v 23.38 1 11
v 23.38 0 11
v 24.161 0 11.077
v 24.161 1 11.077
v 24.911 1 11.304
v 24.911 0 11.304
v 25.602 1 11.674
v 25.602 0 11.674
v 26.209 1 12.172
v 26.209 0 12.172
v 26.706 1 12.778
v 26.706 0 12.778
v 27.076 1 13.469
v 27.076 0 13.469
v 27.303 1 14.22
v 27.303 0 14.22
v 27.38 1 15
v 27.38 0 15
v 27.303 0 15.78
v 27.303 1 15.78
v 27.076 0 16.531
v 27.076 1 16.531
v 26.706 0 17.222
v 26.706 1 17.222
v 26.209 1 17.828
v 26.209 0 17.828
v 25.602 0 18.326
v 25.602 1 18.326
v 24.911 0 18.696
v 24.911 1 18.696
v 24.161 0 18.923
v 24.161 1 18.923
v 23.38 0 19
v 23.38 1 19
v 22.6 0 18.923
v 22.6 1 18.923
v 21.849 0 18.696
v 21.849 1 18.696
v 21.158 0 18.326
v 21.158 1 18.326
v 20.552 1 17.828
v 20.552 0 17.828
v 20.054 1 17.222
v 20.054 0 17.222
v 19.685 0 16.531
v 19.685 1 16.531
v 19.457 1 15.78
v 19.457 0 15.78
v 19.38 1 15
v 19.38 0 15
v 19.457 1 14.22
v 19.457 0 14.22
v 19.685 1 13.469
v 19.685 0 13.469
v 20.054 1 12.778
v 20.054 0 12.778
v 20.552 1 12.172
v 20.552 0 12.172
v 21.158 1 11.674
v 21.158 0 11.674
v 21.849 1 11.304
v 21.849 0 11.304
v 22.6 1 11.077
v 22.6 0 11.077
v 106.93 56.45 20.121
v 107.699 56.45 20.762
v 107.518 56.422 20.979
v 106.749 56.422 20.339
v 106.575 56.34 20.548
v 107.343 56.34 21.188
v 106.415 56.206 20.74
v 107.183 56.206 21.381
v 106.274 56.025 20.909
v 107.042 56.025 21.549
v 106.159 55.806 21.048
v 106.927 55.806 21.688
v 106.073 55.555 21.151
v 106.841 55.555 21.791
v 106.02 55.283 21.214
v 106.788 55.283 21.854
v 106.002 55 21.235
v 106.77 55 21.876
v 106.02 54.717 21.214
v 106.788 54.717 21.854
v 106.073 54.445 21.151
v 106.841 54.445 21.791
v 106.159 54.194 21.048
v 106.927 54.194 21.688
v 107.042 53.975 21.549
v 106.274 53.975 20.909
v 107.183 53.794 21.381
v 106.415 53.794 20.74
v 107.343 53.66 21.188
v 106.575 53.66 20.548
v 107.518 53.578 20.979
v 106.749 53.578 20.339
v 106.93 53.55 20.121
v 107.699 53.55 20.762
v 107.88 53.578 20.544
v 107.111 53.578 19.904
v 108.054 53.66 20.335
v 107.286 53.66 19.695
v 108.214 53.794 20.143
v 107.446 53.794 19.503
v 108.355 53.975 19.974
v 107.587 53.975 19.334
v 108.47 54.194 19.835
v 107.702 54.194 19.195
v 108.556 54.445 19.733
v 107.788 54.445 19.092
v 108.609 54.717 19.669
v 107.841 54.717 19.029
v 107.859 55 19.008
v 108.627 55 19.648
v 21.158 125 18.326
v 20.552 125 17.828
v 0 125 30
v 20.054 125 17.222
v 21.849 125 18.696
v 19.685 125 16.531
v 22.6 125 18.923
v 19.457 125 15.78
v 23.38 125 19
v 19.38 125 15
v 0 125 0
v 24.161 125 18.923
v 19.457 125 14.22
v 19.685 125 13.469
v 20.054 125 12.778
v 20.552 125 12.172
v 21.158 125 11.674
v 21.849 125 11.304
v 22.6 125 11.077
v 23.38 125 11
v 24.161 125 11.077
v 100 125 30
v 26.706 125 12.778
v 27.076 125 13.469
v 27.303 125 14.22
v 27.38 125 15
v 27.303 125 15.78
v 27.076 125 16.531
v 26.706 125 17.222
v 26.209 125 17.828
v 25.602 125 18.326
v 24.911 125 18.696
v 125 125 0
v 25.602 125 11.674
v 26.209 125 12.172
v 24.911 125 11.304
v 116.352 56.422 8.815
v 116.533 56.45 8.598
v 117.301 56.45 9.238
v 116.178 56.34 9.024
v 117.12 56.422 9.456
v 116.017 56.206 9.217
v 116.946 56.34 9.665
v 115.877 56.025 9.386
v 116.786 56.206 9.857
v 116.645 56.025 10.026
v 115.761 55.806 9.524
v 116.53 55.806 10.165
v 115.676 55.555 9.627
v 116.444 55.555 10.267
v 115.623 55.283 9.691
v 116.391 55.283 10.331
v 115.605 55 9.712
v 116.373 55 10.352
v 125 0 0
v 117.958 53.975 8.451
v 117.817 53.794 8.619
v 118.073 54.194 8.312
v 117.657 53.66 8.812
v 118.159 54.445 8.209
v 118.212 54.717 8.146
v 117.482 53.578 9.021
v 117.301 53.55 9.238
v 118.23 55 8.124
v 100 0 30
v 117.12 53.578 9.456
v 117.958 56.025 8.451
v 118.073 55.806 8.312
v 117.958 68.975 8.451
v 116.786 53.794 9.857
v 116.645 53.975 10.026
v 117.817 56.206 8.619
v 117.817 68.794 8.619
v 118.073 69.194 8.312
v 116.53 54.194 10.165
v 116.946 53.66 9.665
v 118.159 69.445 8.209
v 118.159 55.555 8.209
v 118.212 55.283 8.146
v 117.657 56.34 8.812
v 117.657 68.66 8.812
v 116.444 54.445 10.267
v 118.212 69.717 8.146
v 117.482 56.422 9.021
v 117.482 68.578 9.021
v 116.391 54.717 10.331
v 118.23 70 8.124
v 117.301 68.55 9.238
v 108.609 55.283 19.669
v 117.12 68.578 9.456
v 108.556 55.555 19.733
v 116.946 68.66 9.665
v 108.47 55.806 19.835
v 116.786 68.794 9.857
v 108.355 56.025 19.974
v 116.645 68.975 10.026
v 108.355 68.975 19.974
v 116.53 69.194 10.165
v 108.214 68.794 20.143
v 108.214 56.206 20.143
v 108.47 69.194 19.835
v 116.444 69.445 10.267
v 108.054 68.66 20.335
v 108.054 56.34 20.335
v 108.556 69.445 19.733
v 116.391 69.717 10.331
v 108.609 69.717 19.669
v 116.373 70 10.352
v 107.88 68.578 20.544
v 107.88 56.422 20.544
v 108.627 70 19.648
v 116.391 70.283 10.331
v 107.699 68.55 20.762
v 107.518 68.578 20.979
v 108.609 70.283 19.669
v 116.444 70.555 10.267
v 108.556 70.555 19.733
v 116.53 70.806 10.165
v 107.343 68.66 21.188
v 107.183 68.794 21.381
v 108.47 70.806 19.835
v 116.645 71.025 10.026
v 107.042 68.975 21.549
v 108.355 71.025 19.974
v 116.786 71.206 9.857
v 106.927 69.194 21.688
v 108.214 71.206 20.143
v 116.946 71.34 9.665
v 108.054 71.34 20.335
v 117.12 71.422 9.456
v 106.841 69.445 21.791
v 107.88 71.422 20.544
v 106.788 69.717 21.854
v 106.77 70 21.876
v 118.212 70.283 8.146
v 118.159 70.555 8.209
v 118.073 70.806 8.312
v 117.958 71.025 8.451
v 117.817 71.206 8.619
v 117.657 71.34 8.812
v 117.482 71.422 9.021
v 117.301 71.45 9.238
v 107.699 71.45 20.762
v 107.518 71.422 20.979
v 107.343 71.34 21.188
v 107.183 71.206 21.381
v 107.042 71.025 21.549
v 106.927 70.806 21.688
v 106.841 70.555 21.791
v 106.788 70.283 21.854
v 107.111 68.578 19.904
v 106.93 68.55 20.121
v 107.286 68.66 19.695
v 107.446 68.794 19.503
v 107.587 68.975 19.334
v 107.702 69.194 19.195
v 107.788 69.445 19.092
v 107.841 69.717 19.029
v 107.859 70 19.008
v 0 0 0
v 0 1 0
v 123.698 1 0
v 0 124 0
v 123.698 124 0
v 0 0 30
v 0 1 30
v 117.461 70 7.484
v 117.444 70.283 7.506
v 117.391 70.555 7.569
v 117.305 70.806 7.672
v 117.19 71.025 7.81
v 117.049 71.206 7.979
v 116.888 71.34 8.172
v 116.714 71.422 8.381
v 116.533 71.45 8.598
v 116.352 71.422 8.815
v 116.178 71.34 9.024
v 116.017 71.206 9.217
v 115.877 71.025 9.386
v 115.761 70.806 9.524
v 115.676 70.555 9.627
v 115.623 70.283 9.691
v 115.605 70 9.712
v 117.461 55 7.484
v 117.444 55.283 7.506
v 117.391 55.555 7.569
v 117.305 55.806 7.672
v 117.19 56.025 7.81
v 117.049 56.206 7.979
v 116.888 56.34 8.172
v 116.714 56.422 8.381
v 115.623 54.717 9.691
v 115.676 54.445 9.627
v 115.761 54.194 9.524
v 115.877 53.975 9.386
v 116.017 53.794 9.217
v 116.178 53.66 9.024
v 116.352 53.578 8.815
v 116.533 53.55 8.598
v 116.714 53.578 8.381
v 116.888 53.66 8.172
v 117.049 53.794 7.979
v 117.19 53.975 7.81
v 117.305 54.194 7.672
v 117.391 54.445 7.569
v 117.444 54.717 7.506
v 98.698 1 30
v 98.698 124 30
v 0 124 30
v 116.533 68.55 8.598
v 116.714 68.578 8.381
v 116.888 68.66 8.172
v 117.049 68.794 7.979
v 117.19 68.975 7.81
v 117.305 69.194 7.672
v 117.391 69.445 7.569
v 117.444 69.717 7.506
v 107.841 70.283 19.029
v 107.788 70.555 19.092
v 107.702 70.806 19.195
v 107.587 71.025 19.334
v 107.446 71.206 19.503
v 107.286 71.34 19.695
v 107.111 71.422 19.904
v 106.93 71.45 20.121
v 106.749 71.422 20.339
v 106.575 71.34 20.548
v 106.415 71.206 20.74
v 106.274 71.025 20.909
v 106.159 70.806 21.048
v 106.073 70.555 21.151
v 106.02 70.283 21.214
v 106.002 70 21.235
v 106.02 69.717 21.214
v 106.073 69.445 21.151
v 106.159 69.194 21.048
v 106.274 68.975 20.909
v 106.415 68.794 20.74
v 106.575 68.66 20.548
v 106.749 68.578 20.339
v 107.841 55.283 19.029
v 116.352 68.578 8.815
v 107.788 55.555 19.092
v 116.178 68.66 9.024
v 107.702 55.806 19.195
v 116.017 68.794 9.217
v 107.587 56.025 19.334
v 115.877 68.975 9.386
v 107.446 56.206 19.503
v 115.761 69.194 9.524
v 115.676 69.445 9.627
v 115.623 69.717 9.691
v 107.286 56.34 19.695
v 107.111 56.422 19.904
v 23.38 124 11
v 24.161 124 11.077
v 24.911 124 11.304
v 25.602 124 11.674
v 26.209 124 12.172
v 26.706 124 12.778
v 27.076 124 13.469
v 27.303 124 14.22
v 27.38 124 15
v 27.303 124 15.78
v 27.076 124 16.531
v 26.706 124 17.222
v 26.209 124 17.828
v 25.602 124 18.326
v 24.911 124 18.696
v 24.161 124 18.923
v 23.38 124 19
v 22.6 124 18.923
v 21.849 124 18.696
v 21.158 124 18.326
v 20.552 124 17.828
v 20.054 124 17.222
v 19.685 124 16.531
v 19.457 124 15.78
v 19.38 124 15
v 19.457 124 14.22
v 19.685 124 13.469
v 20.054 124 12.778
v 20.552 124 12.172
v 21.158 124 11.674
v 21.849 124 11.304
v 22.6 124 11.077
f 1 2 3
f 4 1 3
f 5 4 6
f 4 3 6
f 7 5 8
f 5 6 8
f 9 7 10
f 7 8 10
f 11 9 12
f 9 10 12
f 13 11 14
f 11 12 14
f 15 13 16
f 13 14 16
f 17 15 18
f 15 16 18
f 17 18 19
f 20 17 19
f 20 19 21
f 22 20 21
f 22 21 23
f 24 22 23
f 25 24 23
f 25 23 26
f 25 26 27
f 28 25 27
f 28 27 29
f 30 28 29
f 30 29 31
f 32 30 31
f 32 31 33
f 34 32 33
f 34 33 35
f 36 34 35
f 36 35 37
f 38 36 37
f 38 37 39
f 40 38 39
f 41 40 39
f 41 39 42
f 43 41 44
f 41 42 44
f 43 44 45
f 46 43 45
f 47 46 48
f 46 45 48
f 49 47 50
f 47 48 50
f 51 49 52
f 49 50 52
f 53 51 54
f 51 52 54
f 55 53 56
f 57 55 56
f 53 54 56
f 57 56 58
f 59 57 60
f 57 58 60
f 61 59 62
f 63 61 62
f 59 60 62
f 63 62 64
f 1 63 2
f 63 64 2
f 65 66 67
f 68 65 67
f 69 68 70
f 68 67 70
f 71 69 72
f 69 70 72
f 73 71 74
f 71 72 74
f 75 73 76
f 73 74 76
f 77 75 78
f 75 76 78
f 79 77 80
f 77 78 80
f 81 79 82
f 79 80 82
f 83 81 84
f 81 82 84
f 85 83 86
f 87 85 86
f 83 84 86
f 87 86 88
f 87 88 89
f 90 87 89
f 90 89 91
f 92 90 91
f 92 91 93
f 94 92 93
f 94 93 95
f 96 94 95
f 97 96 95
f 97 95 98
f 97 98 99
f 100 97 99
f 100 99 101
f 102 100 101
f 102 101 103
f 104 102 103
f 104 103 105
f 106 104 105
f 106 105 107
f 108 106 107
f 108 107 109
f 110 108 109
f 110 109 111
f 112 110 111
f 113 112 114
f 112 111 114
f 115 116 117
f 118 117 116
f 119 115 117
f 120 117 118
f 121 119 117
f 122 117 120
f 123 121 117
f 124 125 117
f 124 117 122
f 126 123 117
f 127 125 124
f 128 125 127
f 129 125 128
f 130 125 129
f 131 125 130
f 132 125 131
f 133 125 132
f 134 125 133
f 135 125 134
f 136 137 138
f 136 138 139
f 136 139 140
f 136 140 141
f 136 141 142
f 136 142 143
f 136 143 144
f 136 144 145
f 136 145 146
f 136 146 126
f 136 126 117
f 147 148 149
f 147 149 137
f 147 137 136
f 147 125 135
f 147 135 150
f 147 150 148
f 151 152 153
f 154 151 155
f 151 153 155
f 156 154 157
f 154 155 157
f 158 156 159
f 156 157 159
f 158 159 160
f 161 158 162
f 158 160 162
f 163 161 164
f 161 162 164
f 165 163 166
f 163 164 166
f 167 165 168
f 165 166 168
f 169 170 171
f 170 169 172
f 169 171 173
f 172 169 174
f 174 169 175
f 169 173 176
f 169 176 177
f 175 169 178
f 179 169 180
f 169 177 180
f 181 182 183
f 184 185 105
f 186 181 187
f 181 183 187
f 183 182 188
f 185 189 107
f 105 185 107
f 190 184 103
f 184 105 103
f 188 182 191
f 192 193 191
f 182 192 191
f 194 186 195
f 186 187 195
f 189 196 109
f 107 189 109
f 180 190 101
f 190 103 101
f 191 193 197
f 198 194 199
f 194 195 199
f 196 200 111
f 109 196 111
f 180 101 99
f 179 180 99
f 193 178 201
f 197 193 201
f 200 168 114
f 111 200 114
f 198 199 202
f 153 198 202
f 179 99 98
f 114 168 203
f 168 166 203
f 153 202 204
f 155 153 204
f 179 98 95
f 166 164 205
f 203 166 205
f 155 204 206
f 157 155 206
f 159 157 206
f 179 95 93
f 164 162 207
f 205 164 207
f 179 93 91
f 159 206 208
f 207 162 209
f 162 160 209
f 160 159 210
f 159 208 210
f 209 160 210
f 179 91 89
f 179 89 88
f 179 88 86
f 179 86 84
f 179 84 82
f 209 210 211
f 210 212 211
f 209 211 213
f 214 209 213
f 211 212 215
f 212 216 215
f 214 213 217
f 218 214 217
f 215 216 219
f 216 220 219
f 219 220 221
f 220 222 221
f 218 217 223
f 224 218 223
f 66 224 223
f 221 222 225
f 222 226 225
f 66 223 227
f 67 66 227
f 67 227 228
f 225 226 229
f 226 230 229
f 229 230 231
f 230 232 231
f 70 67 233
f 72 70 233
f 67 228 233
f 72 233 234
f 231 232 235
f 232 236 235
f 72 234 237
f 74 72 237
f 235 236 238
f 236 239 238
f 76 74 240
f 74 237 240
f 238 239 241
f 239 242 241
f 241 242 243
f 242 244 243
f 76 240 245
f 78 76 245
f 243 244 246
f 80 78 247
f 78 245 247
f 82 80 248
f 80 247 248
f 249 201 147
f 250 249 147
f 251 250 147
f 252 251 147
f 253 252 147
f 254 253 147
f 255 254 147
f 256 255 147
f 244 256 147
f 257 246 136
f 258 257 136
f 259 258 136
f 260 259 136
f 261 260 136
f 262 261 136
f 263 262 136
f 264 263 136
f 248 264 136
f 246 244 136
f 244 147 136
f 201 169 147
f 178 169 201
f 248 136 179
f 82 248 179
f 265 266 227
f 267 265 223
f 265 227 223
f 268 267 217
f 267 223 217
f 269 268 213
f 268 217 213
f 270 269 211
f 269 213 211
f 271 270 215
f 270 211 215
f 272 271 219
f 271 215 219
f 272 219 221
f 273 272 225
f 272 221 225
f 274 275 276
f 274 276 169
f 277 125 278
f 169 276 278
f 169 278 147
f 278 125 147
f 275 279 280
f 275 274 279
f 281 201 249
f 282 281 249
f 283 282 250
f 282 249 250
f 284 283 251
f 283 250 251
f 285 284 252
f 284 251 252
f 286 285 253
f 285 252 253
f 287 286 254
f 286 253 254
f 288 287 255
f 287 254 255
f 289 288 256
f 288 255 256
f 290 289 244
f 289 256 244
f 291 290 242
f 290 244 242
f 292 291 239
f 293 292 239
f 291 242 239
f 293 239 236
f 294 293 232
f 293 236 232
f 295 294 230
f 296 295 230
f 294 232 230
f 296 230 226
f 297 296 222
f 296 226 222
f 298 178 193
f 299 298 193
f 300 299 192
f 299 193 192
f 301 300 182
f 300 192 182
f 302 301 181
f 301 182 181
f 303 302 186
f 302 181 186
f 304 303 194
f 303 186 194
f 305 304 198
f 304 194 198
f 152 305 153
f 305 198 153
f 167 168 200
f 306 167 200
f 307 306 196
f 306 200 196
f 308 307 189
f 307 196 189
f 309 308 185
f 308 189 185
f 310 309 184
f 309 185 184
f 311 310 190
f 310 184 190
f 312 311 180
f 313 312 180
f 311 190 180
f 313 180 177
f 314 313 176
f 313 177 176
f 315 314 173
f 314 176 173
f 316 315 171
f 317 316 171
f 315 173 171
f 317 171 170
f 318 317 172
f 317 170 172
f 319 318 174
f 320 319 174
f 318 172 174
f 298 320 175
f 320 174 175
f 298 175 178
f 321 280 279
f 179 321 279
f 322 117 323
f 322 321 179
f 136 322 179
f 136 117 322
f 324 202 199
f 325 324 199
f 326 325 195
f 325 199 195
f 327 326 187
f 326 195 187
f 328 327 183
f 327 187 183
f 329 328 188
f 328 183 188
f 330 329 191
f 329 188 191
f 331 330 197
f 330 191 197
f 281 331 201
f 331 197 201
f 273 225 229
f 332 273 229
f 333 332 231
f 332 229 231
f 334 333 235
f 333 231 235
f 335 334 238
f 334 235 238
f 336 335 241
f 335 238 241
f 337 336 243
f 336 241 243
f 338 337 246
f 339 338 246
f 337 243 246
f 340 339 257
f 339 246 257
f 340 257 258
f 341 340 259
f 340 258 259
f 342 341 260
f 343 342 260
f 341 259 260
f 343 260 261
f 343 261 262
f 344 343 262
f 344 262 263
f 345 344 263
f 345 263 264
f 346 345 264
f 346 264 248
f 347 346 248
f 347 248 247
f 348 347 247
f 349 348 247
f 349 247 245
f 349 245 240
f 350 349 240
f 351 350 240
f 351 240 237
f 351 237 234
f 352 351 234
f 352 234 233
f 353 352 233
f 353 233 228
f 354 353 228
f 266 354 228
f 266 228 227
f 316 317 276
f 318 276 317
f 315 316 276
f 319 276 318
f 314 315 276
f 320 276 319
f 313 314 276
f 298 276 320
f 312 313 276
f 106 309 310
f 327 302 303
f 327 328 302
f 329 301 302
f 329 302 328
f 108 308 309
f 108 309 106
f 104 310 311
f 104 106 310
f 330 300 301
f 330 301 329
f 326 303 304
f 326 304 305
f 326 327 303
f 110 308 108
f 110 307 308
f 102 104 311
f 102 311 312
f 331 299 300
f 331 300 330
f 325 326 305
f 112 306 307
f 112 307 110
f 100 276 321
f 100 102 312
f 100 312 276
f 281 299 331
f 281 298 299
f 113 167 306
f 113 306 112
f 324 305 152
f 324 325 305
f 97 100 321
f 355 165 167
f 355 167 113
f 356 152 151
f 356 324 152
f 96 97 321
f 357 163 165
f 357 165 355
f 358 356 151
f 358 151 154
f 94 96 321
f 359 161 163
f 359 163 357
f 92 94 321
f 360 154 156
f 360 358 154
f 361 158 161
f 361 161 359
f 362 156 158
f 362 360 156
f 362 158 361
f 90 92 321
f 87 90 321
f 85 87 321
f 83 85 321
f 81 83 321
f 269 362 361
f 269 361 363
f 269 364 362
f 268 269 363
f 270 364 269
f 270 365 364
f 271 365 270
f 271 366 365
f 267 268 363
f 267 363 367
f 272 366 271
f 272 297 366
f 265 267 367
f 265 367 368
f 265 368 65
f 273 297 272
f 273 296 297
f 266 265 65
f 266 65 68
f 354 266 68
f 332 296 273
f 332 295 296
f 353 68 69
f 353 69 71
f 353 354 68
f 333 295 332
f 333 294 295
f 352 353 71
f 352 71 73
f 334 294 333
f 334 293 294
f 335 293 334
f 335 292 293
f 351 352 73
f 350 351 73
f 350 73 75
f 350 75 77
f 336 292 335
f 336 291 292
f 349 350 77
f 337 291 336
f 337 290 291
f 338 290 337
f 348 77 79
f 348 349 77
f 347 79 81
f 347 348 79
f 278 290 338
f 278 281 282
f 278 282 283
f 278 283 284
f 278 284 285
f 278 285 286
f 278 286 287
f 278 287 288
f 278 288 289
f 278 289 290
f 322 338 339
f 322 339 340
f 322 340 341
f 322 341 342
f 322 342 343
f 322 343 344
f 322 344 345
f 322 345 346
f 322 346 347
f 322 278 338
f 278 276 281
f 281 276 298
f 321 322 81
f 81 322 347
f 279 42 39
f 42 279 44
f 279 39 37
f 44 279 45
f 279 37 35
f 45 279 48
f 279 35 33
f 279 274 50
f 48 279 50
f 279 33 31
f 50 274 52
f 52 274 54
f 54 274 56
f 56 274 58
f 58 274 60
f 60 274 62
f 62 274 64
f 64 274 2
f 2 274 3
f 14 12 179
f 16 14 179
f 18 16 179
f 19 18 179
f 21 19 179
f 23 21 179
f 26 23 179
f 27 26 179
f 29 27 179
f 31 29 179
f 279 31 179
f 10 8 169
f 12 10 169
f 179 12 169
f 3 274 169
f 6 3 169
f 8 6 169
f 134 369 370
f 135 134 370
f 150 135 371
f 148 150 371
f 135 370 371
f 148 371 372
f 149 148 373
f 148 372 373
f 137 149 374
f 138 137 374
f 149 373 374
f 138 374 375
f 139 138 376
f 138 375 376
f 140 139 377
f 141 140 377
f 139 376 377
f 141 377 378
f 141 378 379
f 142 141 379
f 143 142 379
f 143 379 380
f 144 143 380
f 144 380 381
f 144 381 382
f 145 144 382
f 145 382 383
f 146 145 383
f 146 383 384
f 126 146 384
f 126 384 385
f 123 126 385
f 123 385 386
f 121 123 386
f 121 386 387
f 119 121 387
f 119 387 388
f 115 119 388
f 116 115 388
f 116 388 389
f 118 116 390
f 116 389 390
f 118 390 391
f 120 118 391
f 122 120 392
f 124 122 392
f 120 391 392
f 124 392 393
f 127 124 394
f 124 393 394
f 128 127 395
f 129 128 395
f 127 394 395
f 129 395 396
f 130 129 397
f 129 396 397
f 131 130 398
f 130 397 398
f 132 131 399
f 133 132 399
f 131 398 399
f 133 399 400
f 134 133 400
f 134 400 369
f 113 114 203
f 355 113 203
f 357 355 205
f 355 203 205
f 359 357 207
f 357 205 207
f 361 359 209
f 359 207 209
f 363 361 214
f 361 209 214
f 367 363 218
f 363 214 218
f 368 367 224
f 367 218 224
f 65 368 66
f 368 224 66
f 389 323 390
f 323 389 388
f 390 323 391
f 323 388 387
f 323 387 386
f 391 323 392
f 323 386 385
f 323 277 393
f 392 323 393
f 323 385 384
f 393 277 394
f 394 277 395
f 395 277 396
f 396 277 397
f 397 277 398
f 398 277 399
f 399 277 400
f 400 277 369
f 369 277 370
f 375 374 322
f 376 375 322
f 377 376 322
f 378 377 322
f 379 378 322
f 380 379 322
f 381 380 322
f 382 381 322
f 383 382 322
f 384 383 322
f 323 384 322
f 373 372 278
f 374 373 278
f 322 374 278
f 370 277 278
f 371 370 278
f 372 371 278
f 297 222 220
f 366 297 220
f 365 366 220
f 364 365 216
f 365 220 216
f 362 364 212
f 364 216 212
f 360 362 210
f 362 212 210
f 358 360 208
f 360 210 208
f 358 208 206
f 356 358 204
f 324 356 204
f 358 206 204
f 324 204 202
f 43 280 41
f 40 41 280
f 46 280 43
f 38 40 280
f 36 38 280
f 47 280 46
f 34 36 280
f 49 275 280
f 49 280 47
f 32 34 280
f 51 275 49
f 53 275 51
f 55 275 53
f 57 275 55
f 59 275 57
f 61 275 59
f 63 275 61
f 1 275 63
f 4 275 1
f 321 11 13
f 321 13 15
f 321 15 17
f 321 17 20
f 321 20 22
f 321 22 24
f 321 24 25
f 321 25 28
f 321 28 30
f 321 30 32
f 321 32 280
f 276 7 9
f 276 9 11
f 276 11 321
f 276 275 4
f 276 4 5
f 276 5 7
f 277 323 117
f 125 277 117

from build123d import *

# Parameters (mm, degrees)
SKETCH1_W           = 125
SKETCH1_H           = 125
BOSS_EXTRUDE1_DEPTH = 30
CUT_EXTRUDE1_DEPTH  = 125
SHELL1_T            = -1
SKETCH3_R           = 4
CUT_EXTRUDE2_DEPTH  = 125
CUT_EXTRUDE3_DEPTH  = 125


with BuildPart() as part:
    # Sketch1 → Boss-Extrude1 (new body)
    with BuildSketch(Plane.XY):
        with Locations((62.5, 62.5)):
            Rectangle(SKETCH1_W, SKETCH1_H)
    extrude(amount=BOSS_EXTRUDE1_DEPTH)

    # Sketch2 → Cut-Extrude1 (cut)
    with BuildSketch(Plane(origin=(0, 125, 0), x_dir=(1, 0, 0), z_dir=(0, 1, 0))):
        Polygon((125, 0), (100, -30), (125, -30), align=None)
    extrude(amount=-CUT_EXTRUDE1_DEPTH, mode=Mode.SUBTRACT)

    # Shell1
    shell1_openings = [part.faces().sort_by_distance(p)[0] for p in [
        (50, 62.5, 30),
        (62.5, 62.5, 0),
        (0, 62.5, 15),
    ]]
    offset(amount=SHELL1_T, openings=shell1_openings, kind=Kind.INTERSECTION)

    # Sketch3 → Cut-Extrude2 (cut)
    with BuildSketch(Plane(origin=(0, 0, 0), x_dir=(-1, 0, 0), z_dir=(0, -1, 0))):
        with Locations(Location((-23.380174368, -15, 0), (0, 0, 90))):
            Circle(SKETCH3_R)
    extrude(amount=-CUT_EXTRUDE2_DEPTH, mode=Mode.SUBTRACT)

    # Sketch4 → Cut-Extrude3 (cut)
    with BuildSketch(Plane(origin=(73.770491803, 0, 61.475409836), x_dir=(0.6401843996644799, 0, -0.7682212795973759), z_dir=(0.768221279597376, 0, 0.6401843996644799))):
        with BuildLine():
            Line((52.997425768, 68.55), (52.997425768, 70))
            Line((52.997425768, 70), (54.447425768, 70))
            ThreePointArc((54.447425768, 70), (51.972120936, 71.025304833), (52.997425768, 68.55))
        make_face()
        with BuildLine():
            Line((54.447425768, 70), (52.997425768, 70))
            Line((52.997425768, 70), (52.997425768, 68.55))
            ThreePointArc((52.997425768, 68.55), (54.022730601, 68.974695167), (54.447425768, 70))
        make_face()
        with BuildLine():
            ThreePointArc((69.447425768, 70), (67.997425768, 71.45), (66.547425768, 70))
            Line((66.547425768, 70), (67.997425768, 70))
            Line((67.997425768, 70), (67.997425768, 68.55))
            ThreePointArc((67.997425768, 68.55), (69.022730601, 68.974695167), (69.447425768, 70))
        make_face()
        with BuildLine():
            Line((67.997425768, 70), (66.547425768, 70))
            ThreePointArc((66.547425768, 70), (66.972120936, 68.974695167), (67.997425768, 68.55))
            Line((67.997425768, 68.55), (67.997425768, 70))
        make_face()
        with BuildLine():
            ThreePointArc((54.447425768, 55), (54.022730601, 56.025304833), (52.997425768, 56.45))
            Line((52.997425768, 56.45), (52.997425768, 55))
            Line((52.997425768, 55), (54.447425768, 55))
        make_face()
        with BuildLine():
            Line((52.997425768, 55), (52.997425768, 56.45))
            ThreePointArc((52.997425768, 56.45), (51.972120936, 53.974695167), (54.447425768, 55))
            Line((54.447425768, 55), (52.997425768, 55))
        make_face()
        with BuildLine():
            ThreePointArc((69.447425768, 55), (69.022730601, 56.025304833), (67.997425768, 56.45))
            Line((67.997425768, 56.45), (67.997425768, 55))
            Line((67.997425768, 55), (66.547425768, 55))
            ThreePointArc((66.547425768, 55), (67.997425768, 53.55), (69.447425768, 55))
        make_face()
        with BuildLine():
            Line((67.997425768, 55), (67.997425768, 56.45))
            ThreePointArc((67.997425768, 56.45), (66.972120936, 56.025304833), (66.547425768, 55))
            Line((66.547425768, 55), (67.997425768, 55))
        make_face()
    extrude(amount=-CUT_EXTRUDE3_DEPTH, mode=Mode.SUBTRACT)


solid = part.part
